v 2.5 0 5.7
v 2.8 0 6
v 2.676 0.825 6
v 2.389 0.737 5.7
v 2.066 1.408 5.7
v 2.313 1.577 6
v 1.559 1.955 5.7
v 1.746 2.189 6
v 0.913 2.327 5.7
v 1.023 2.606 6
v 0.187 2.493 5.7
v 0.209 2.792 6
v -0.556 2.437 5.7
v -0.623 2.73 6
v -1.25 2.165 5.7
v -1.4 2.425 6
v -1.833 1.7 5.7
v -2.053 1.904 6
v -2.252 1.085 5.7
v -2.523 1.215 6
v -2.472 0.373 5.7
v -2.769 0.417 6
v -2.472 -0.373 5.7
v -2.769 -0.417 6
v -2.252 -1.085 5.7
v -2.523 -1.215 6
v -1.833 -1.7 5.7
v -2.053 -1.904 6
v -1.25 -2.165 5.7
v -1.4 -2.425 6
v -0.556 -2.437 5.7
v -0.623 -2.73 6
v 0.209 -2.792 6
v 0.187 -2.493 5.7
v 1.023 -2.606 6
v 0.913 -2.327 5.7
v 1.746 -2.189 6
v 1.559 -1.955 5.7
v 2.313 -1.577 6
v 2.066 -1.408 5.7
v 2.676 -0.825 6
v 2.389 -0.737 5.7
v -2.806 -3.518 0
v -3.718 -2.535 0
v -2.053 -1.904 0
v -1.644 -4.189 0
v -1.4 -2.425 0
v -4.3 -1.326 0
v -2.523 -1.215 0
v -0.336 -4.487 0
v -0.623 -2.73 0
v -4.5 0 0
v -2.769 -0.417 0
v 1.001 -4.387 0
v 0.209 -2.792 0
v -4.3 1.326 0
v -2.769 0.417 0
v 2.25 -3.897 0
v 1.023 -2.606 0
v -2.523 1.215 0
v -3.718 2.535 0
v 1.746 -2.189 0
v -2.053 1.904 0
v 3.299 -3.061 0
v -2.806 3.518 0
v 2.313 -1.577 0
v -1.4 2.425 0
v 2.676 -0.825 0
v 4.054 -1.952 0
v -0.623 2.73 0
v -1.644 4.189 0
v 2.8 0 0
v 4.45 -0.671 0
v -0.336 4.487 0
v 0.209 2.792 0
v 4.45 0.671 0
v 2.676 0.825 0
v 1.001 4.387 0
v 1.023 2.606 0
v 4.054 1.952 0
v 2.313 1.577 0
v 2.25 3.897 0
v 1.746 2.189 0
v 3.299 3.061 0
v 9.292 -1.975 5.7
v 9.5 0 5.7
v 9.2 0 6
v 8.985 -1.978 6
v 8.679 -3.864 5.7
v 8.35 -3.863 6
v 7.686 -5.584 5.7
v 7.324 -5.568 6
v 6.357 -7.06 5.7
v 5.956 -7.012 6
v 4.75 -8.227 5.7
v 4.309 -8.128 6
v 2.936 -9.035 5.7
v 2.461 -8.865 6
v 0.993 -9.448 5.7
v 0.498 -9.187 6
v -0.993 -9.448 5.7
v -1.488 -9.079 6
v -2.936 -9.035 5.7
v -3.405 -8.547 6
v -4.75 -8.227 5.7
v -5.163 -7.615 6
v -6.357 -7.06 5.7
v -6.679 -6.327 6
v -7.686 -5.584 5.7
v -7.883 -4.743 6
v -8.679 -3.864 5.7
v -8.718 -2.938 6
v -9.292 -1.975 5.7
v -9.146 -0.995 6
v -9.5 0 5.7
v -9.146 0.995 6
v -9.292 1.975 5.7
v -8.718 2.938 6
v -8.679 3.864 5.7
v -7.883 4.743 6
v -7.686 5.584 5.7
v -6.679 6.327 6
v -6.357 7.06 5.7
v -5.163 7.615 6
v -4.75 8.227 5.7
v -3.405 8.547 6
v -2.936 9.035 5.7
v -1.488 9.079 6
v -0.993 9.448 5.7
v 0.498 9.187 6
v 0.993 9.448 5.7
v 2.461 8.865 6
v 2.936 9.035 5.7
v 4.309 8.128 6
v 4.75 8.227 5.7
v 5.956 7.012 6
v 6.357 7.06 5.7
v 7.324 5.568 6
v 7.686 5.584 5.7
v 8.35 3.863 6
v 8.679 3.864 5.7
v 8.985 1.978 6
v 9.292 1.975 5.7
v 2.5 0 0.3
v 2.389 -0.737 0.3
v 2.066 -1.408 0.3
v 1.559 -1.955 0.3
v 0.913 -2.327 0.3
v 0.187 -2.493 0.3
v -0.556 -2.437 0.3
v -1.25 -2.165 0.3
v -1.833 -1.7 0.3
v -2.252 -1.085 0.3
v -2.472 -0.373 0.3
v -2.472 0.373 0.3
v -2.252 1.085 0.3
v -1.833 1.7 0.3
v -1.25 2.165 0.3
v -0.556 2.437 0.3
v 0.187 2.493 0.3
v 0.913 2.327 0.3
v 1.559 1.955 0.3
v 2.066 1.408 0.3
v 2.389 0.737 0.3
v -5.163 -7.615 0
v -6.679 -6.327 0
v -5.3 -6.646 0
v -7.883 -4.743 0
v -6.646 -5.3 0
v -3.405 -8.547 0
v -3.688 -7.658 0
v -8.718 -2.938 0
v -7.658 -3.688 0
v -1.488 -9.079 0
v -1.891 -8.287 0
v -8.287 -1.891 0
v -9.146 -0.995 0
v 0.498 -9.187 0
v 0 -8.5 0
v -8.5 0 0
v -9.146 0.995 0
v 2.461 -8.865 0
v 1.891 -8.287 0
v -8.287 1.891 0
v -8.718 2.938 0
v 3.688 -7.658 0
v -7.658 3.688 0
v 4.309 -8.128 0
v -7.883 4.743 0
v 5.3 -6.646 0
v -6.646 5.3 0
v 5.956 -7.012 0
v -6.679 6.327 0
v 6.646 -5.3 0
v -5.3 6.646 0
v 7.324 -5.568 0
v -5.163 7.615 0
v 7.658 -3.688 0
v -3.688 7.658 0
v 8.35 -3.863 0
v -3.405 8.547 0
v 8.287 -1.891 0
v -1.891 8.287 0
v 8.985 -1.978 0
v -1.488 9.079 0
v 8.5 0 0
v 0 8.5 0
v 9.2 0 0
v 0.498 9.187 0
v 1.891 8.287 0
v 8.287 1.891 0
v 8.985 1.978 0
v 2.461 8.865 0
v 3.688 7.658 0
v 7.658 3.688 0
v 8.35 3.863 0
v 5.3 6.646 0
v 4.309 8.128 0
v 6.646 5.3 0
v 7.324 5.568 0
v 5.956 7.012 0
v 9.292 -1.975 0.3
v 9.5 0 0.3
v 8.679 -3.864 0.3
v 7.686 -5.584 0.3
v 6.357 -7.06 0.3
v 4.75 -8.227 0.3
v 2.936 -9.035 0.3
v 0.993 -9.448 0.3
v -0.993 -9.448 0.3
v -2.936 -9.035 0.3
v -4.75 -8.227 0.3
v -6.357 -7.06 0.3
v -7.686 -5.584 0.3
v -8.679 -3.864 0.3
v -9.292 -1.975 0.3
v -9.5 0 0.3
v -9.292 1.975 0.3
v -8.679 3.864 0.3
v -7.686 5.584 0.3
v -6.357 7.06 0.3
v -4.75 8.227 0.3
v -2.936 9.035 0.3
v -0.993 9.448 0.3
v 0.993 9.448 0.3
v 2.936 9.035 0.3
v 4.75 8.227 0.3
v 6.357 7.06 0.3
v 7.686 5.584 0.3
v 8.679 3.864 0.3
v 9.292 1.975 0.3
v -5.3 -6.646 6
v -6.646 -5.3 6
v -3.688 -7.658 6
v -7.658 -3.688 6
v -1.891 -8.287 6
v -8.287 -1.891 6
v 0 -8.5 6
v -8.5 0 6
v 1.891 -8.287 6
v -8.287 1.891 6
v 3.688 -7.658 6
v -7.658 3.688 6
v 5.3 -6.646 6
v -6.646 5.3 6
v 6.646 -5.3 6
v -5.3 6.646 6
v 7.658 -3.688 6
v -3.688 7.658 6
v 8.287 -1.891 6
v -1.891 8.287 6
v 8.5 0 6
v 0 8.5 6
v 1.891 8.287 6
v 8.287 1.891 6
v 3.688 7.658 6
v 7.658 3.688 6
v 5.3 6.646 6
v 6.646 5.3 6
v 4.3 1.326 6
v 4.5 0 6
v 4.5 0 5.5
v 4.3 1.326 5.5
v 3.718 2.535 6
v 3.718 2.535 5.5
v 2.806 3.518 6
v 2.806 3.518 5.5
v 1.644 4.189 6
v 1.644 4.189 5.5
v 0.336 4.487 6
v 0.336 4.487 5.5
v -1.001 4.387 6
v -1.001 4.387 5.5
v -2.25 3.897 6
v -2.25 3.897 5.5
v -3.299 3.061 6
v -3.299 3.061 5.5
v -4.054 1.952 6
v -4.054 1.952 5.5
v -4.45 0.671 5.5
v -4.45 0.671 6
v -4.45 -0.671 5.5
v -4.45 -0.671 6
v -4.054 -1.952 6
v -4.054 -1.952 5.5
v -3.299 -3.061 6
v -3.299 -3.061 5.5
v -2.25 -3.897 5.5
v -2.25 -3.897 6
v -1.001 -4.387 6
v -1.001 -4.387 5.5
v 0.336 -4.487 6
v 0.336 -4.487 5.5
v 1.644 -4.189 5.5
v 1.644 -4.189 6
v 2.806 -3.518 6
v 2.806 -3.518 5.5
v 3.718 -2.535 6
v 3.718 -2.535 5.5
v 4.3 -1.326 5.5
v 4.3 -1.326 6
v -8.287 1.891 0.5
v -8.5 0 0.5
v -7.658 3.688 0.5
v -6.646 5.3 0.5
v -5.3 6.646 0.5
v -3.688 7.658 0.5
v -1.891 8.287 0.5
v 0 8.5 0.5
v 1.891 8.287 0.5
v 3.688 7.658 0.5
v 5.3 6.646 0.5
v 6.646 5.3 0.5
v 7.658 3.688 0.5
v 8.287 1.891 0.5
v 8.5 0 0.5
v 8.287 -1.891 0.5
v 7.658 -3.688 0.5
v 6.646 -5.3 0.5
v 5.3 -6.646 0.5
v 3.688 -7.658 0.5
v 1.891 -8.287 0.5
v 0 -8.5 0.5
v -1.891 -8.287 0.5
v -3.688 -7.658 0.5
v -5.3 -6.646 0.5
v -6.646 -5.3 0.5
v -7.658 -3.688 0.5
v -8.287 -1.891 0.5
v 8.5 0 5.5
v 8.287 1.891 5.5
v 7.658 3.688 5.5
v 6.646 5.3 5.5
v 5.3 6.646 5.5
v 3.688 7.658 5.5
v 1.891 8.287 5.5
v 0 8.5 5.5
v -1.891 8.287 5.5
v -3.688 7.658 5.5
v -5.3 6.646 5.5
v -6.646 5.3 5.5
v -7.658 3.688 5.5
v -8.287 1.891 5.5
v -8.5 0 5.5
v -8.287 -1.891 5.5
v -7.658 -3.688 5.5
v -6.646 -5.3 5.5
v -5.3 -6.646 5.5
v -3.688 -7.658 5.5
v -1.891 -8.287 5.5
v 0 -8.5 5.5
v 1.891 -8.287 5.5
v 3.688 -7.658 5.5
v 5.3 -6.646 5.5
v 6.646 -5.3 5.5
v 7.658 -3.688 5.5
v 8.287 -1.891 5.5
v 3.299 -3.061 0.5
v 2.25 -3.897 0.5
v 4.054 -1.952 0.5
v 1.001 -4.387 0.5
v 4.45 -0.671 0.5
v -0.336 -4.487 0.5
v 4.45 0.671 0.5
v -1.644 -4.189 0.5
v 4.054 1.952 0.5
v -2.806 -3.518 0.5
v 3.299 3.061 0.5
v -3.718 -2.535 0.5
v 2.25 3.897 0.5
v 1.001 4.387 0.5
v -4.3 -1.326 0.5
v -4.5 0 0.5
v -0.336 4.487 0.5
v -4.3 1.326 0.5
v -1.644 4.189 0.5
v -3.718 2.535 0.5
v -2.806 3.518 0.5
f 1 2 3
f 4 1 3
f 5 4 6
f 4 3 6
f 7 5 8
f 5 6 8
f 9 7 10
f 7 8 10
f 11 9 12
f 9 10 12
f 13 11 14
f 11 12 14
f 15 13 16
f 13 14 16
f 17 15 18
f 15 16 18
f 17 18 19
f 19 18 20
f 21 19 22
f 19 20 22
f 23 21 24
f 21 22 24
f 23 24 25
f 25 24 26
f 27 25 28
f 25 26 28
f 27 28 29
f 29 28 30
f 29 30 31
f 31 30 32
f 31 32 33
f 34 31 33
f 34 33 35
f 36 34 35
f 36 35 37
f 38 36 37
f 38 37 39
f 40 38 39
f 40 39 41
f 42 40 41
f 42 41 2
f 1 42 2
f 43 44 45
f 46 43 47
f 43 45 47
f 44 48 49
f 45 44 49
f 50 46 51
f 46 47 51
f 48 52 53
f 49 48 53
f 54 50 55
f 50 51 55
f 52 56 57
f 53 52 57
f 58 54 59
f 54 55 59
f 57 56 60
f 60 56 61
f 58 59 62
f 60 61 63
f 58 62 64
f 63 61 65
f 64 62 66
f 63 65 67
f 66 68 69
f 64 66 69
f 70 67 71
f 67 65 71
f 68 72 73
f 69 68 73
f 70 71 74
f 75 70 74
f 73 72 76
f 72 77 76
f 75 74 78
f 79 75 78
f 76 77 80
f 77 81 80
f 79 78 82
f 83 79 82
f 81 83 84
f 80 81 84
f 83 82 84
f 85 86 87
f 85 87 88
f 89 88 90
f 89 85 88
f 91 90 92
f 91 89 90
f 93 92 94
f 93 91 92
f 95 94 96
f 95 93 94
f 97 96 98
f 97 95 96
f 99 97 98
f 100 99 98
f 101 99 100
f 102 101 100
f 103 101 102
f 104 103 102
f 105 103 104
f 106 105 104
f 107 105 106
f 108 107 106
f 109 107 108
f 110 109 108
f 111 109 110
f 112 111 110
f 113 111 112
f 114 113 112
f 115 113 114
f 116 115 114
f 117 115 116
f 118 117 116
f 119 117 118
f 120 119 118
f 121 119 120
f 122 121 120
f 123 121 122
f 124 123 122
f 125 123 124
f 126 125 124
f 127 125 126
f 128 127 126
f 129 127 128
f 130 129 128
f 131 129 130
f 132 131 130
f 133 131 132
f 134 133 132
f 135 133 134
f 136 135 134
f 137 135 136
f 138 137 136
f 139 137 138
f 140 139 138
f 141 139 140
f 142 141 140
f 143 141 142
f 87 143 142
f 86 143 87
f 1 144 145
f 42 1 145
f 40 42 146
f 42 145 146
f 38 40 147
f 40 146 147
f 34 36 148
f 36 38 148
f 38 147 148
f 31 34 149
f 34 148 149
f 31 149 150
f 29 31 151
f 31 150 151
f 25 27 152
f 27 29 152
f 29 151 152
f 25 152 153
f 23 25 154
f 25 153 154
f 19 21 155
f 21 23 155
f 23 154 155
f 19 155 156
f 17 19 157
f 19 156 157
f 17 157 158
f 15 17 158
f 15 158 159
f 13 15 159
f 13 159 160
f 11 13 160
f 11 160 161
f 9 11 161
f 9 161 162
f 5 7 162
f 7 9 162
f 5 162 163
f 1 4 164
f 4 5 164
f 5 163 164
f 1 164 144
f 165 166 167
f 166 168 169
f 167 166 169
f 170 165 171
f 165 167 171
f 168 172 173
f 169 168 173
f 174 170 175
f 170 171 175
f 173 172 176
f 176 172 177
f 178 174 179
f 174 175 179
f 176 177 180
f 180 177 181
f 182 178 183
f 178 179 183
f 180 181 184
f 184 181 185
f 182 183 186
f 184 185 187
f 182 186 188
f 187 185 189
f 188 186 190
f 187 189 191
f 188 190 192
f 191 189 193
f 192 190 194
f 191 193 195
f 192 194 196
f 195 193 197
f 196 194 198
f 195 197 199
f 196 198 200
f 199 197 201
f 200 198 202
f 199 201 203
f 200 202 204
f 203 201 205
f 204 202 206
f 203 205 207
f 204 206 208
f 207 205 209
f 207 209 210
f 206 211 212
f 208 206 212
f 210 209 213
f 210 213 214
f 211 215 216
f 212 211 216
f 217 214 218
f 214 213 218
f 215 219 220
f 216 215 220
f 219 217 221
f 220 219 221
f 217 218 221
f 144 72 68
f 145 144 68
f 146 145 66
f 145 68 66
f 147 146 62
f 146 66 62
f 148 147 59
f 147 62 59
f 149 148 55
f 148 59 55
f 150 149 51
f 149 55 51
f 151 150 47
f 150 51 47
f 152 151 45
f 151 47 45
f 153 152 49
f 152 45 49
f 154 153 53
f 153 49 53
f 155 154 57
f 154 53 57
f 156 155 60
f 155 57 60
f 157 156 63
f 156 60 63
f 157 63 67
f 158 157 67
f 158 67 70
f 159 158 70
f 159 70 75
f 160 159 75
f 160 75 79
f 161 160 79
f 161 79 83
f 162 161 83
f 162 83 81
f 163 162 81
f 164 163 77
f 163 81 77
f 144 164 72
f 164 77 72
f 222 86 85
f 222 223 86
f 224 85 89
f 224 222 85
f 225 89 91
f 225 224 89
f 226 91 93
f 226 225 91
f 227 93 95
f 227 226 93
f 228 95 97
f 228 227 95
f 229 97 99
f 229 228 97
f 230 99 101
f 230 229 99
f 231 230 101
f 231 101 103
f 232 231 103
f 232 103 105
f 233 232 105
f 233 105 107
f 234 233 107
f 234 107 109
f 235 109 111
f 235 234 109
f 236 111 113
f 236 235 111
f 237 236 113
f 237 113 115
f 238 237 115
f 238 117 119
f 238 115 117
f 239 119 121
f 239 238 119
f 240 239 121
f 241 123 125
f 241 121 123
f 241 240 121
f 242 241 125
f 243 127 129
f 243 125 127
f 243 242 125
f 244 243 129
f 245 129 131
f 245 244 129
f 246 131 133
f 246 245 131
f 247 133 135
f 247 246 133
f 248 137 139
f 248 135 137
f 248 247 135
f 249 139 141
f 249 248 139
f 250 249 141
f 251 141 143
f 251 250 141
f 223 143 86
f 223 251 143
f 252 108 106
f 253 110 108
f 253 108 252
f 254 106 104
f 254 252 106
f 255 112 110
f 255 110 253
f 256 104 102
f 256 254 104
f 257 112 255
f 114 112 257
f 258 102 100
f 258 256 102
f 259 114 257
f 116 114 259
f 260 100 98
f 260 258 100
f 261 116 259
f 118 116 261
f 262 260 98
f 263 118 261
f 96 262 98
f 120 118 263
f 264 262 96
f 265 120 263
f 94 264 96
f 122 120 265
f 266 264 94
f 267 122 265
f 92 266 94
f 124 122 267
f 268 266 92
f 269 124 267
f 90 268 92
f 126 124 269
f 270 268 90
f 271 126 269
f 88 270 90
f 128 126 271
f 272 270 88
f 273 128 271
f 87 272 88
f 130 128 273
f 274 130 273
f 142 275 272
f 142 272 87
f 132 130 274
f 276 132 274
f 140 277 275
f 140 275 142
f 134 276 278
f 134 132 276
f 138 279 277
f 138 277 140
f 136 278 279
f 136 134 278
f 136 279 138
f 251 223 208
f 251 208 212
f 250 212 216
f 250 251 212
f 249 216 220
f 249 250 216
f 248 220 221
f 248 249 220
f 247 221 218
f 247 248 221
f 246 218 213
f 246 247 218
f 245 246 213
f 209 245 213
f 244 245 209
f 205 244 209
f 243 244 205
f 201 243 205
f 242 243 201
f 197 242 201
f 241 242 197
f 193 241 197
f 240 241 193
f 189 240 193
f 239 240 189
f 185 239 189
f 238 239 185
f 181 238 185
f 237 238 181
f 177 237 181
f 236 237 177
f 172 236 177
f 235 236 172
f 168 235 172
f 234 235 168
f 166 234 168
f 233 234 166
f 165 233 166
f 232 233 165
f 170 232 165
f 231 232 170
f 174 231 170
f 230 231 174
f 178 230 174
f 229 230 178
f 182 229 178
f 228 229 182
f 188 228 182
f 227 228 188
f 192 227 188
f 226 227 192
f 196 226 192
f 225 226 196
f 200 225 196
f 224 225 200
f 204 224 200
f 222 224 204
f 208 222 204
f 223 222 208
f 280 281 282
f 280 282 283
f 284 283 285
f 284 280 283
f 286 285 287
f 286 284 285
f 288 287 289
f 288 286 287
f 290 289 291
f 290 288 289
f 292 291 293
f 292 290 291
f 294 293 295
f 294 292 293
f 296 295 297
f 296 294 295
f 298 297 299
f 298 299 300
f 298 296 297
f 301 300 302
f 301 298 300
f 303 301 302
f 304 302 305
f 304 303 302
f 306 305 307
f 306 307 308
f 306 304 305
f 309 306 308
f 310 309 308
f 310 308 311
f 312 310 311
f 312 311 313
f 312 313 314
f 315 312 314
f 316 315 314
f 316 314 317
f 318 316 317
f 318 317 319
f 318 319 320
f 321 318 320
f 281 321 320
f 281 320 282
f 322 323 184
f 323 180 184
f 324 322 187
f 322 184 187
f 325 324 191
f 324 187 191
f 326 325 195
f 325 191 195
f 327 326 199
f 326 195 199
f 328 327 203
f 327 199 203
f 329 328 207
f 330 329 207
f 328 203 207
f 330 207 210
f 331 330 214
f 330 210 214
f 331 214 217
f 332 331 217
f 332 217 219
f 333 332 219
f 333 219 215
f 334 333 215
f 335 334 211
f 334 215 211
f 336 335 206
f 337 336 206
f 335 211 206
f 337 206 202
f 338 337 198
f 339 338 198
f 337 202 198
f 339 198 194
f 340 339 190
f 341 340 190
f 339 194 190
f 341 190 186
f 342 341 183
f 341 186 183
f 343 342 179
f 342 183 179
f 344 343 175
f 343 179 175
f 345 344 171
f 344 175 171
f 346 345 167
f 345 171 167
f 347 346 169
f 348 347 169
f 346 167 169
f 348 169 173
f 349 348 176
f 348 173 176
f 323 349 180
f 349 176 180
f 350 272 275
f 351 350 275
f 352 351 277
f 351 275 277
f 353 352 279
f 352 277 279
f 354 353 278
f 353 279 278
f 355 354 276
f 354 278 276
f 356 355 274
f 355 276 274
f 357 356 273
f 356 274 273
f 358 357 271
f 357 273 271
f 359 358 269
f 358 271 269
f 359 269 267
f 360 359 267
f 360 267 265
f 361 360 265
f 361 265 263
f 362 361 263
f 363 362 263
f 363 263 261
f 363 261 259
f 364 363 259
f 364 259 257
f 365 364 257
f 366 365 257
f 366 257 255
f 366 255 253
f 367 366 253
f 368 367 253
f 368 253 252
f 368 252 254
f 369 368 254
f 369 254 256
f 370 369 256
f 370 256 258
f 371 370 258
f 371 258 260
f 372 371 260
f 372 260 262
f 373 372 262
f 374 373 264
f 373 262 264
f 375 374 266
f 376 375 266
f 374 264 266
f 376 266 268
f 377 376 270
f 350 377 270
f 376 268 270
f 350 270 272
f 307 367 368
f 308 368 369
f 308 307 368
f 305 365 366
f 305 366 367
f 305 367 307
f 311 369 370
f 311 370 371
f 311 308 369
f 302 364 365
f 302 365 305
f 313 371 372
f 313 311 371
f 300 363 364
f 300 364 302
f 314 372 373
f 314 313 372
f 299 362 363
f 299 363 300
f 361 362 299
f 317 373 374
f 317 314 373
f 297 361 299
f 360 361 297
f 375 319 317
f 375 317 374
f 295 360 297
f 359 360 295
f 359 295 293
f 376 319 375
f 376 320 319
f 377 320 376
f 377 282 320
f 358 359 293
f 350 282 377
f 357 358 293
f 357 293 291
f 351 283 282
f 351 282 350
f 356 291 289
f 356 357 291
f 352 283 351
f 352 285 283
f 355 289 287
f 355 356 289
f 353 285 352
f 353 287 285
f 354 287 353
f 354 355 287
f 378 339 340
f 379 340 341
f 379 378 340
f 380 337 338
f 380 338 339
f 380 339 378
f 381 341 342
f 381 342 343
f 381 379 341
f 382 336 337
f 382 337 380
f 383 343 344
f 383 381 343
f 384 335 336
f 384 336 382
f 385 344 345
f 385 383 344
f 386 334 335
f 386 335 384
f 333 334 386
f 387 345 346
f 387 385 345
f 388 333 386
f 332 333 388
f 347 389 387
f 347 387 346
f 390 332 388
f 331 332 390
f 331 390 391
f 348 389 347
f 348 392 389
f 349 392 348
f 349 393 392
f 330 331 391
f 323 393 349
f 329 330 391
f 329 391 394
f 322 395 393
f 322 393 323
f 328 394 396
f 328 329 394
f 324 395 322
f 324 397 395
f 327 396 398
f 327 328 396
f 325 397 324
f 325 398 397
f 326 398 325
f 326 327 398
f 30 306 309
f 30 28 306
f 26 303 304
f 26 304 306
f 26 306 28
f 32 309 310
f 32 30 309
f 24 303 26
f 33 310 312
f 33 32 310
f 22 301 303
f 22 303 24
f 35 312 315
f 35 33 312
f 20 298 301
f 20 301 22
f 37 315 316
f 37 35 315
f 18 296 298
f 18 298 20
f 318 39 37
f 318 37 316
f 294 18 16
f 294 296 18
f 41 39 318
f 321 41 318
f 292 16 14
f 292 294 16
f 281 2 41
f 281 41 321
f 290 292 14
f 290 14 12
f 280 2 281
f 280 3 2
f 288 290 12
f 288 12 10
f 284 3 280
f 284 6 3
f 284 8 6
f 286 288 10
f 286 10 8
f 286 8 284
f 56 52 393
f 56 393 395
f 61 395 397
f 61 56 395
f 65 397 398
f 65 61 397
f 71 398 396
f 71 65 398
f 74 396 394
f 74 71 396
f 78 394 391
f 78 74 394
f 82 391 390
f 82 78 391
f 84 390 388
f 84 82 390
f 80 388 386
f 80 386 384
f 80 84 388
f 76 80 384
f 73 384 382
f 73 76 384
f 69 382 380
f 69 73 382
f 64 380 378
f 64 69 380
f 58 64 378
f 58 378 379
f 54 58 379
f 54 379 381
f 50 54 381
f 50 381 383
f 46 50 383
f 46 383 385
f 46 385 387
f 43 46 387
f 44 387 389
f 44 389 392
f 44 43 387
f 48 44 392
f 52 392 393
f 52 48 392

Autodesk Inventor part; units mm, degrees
ref_plane "YZ Plane" through (0, 0, 0) normal (1, 0, 0) x (0, 1, 0)
ref_plane "XZ Plane" through (0, 0, 0) normal (0, 1, 0) x (-1, 0, 0)
ref_plane "XY Plane" through (0, 0, 0) normal (0, 0, 1) x (1, 0, 0)
sketch "Szkic1" plane through (0, 0, 0) normal (0, 0, 1) x (1, 0, 0)
  circle A0 centre (0, 0) radius 2.5
  circle A1 centre (0, 0) radius 9.5
  dimension "d0" = 5
  dimension "d1" = 19
extrude "Wyciągnięcie proste1" add sketch "Szkic1" along normal blind 6
chamfer "Faza1" distance 0.3 angle 45 4 edges at (-9.5, 0, 6) (-2.5, 0, 6) (-9.5, 0, 0) (-2.5, 0, 0)
sketch "Szkic2" plane through (0, 0, 0) normal (0, 0, -1) x (-1, 0, 0)
  circle A0 centre (0, 0) radius 9.2 projected
  circle A1 centre (0, 0) radius 2.8 projected
  circle A2 centre (0, 0) radius 9.5 projected
  circle A3 centre (0, 0) radius 2.5 projected
  circle A4 centre (0, 0) radius 4.5
  circle A5 centre (0, 0) radius 8.5
  dimension "d7" = 2
  dimension "d8" = 1
extrude "Wyciągnięcie proste2" cut sketch "Szkic2" against normal blind 0.5 contours A5
sketch "Szkic3" plane through (0, 0, 6) normal (0, 0, 1) x (1, 0, 0)
  circle A0 centre (0, 0) radius 8.5 projected
  circle A1 centre (0, 0) radius 4.5 projected
extrude "Wyciągnięcie proste3" cut sketch "Szkic3" against normal blind 0.5
properties part number "COTS_GENERIC_Bearing_19x5x6"
